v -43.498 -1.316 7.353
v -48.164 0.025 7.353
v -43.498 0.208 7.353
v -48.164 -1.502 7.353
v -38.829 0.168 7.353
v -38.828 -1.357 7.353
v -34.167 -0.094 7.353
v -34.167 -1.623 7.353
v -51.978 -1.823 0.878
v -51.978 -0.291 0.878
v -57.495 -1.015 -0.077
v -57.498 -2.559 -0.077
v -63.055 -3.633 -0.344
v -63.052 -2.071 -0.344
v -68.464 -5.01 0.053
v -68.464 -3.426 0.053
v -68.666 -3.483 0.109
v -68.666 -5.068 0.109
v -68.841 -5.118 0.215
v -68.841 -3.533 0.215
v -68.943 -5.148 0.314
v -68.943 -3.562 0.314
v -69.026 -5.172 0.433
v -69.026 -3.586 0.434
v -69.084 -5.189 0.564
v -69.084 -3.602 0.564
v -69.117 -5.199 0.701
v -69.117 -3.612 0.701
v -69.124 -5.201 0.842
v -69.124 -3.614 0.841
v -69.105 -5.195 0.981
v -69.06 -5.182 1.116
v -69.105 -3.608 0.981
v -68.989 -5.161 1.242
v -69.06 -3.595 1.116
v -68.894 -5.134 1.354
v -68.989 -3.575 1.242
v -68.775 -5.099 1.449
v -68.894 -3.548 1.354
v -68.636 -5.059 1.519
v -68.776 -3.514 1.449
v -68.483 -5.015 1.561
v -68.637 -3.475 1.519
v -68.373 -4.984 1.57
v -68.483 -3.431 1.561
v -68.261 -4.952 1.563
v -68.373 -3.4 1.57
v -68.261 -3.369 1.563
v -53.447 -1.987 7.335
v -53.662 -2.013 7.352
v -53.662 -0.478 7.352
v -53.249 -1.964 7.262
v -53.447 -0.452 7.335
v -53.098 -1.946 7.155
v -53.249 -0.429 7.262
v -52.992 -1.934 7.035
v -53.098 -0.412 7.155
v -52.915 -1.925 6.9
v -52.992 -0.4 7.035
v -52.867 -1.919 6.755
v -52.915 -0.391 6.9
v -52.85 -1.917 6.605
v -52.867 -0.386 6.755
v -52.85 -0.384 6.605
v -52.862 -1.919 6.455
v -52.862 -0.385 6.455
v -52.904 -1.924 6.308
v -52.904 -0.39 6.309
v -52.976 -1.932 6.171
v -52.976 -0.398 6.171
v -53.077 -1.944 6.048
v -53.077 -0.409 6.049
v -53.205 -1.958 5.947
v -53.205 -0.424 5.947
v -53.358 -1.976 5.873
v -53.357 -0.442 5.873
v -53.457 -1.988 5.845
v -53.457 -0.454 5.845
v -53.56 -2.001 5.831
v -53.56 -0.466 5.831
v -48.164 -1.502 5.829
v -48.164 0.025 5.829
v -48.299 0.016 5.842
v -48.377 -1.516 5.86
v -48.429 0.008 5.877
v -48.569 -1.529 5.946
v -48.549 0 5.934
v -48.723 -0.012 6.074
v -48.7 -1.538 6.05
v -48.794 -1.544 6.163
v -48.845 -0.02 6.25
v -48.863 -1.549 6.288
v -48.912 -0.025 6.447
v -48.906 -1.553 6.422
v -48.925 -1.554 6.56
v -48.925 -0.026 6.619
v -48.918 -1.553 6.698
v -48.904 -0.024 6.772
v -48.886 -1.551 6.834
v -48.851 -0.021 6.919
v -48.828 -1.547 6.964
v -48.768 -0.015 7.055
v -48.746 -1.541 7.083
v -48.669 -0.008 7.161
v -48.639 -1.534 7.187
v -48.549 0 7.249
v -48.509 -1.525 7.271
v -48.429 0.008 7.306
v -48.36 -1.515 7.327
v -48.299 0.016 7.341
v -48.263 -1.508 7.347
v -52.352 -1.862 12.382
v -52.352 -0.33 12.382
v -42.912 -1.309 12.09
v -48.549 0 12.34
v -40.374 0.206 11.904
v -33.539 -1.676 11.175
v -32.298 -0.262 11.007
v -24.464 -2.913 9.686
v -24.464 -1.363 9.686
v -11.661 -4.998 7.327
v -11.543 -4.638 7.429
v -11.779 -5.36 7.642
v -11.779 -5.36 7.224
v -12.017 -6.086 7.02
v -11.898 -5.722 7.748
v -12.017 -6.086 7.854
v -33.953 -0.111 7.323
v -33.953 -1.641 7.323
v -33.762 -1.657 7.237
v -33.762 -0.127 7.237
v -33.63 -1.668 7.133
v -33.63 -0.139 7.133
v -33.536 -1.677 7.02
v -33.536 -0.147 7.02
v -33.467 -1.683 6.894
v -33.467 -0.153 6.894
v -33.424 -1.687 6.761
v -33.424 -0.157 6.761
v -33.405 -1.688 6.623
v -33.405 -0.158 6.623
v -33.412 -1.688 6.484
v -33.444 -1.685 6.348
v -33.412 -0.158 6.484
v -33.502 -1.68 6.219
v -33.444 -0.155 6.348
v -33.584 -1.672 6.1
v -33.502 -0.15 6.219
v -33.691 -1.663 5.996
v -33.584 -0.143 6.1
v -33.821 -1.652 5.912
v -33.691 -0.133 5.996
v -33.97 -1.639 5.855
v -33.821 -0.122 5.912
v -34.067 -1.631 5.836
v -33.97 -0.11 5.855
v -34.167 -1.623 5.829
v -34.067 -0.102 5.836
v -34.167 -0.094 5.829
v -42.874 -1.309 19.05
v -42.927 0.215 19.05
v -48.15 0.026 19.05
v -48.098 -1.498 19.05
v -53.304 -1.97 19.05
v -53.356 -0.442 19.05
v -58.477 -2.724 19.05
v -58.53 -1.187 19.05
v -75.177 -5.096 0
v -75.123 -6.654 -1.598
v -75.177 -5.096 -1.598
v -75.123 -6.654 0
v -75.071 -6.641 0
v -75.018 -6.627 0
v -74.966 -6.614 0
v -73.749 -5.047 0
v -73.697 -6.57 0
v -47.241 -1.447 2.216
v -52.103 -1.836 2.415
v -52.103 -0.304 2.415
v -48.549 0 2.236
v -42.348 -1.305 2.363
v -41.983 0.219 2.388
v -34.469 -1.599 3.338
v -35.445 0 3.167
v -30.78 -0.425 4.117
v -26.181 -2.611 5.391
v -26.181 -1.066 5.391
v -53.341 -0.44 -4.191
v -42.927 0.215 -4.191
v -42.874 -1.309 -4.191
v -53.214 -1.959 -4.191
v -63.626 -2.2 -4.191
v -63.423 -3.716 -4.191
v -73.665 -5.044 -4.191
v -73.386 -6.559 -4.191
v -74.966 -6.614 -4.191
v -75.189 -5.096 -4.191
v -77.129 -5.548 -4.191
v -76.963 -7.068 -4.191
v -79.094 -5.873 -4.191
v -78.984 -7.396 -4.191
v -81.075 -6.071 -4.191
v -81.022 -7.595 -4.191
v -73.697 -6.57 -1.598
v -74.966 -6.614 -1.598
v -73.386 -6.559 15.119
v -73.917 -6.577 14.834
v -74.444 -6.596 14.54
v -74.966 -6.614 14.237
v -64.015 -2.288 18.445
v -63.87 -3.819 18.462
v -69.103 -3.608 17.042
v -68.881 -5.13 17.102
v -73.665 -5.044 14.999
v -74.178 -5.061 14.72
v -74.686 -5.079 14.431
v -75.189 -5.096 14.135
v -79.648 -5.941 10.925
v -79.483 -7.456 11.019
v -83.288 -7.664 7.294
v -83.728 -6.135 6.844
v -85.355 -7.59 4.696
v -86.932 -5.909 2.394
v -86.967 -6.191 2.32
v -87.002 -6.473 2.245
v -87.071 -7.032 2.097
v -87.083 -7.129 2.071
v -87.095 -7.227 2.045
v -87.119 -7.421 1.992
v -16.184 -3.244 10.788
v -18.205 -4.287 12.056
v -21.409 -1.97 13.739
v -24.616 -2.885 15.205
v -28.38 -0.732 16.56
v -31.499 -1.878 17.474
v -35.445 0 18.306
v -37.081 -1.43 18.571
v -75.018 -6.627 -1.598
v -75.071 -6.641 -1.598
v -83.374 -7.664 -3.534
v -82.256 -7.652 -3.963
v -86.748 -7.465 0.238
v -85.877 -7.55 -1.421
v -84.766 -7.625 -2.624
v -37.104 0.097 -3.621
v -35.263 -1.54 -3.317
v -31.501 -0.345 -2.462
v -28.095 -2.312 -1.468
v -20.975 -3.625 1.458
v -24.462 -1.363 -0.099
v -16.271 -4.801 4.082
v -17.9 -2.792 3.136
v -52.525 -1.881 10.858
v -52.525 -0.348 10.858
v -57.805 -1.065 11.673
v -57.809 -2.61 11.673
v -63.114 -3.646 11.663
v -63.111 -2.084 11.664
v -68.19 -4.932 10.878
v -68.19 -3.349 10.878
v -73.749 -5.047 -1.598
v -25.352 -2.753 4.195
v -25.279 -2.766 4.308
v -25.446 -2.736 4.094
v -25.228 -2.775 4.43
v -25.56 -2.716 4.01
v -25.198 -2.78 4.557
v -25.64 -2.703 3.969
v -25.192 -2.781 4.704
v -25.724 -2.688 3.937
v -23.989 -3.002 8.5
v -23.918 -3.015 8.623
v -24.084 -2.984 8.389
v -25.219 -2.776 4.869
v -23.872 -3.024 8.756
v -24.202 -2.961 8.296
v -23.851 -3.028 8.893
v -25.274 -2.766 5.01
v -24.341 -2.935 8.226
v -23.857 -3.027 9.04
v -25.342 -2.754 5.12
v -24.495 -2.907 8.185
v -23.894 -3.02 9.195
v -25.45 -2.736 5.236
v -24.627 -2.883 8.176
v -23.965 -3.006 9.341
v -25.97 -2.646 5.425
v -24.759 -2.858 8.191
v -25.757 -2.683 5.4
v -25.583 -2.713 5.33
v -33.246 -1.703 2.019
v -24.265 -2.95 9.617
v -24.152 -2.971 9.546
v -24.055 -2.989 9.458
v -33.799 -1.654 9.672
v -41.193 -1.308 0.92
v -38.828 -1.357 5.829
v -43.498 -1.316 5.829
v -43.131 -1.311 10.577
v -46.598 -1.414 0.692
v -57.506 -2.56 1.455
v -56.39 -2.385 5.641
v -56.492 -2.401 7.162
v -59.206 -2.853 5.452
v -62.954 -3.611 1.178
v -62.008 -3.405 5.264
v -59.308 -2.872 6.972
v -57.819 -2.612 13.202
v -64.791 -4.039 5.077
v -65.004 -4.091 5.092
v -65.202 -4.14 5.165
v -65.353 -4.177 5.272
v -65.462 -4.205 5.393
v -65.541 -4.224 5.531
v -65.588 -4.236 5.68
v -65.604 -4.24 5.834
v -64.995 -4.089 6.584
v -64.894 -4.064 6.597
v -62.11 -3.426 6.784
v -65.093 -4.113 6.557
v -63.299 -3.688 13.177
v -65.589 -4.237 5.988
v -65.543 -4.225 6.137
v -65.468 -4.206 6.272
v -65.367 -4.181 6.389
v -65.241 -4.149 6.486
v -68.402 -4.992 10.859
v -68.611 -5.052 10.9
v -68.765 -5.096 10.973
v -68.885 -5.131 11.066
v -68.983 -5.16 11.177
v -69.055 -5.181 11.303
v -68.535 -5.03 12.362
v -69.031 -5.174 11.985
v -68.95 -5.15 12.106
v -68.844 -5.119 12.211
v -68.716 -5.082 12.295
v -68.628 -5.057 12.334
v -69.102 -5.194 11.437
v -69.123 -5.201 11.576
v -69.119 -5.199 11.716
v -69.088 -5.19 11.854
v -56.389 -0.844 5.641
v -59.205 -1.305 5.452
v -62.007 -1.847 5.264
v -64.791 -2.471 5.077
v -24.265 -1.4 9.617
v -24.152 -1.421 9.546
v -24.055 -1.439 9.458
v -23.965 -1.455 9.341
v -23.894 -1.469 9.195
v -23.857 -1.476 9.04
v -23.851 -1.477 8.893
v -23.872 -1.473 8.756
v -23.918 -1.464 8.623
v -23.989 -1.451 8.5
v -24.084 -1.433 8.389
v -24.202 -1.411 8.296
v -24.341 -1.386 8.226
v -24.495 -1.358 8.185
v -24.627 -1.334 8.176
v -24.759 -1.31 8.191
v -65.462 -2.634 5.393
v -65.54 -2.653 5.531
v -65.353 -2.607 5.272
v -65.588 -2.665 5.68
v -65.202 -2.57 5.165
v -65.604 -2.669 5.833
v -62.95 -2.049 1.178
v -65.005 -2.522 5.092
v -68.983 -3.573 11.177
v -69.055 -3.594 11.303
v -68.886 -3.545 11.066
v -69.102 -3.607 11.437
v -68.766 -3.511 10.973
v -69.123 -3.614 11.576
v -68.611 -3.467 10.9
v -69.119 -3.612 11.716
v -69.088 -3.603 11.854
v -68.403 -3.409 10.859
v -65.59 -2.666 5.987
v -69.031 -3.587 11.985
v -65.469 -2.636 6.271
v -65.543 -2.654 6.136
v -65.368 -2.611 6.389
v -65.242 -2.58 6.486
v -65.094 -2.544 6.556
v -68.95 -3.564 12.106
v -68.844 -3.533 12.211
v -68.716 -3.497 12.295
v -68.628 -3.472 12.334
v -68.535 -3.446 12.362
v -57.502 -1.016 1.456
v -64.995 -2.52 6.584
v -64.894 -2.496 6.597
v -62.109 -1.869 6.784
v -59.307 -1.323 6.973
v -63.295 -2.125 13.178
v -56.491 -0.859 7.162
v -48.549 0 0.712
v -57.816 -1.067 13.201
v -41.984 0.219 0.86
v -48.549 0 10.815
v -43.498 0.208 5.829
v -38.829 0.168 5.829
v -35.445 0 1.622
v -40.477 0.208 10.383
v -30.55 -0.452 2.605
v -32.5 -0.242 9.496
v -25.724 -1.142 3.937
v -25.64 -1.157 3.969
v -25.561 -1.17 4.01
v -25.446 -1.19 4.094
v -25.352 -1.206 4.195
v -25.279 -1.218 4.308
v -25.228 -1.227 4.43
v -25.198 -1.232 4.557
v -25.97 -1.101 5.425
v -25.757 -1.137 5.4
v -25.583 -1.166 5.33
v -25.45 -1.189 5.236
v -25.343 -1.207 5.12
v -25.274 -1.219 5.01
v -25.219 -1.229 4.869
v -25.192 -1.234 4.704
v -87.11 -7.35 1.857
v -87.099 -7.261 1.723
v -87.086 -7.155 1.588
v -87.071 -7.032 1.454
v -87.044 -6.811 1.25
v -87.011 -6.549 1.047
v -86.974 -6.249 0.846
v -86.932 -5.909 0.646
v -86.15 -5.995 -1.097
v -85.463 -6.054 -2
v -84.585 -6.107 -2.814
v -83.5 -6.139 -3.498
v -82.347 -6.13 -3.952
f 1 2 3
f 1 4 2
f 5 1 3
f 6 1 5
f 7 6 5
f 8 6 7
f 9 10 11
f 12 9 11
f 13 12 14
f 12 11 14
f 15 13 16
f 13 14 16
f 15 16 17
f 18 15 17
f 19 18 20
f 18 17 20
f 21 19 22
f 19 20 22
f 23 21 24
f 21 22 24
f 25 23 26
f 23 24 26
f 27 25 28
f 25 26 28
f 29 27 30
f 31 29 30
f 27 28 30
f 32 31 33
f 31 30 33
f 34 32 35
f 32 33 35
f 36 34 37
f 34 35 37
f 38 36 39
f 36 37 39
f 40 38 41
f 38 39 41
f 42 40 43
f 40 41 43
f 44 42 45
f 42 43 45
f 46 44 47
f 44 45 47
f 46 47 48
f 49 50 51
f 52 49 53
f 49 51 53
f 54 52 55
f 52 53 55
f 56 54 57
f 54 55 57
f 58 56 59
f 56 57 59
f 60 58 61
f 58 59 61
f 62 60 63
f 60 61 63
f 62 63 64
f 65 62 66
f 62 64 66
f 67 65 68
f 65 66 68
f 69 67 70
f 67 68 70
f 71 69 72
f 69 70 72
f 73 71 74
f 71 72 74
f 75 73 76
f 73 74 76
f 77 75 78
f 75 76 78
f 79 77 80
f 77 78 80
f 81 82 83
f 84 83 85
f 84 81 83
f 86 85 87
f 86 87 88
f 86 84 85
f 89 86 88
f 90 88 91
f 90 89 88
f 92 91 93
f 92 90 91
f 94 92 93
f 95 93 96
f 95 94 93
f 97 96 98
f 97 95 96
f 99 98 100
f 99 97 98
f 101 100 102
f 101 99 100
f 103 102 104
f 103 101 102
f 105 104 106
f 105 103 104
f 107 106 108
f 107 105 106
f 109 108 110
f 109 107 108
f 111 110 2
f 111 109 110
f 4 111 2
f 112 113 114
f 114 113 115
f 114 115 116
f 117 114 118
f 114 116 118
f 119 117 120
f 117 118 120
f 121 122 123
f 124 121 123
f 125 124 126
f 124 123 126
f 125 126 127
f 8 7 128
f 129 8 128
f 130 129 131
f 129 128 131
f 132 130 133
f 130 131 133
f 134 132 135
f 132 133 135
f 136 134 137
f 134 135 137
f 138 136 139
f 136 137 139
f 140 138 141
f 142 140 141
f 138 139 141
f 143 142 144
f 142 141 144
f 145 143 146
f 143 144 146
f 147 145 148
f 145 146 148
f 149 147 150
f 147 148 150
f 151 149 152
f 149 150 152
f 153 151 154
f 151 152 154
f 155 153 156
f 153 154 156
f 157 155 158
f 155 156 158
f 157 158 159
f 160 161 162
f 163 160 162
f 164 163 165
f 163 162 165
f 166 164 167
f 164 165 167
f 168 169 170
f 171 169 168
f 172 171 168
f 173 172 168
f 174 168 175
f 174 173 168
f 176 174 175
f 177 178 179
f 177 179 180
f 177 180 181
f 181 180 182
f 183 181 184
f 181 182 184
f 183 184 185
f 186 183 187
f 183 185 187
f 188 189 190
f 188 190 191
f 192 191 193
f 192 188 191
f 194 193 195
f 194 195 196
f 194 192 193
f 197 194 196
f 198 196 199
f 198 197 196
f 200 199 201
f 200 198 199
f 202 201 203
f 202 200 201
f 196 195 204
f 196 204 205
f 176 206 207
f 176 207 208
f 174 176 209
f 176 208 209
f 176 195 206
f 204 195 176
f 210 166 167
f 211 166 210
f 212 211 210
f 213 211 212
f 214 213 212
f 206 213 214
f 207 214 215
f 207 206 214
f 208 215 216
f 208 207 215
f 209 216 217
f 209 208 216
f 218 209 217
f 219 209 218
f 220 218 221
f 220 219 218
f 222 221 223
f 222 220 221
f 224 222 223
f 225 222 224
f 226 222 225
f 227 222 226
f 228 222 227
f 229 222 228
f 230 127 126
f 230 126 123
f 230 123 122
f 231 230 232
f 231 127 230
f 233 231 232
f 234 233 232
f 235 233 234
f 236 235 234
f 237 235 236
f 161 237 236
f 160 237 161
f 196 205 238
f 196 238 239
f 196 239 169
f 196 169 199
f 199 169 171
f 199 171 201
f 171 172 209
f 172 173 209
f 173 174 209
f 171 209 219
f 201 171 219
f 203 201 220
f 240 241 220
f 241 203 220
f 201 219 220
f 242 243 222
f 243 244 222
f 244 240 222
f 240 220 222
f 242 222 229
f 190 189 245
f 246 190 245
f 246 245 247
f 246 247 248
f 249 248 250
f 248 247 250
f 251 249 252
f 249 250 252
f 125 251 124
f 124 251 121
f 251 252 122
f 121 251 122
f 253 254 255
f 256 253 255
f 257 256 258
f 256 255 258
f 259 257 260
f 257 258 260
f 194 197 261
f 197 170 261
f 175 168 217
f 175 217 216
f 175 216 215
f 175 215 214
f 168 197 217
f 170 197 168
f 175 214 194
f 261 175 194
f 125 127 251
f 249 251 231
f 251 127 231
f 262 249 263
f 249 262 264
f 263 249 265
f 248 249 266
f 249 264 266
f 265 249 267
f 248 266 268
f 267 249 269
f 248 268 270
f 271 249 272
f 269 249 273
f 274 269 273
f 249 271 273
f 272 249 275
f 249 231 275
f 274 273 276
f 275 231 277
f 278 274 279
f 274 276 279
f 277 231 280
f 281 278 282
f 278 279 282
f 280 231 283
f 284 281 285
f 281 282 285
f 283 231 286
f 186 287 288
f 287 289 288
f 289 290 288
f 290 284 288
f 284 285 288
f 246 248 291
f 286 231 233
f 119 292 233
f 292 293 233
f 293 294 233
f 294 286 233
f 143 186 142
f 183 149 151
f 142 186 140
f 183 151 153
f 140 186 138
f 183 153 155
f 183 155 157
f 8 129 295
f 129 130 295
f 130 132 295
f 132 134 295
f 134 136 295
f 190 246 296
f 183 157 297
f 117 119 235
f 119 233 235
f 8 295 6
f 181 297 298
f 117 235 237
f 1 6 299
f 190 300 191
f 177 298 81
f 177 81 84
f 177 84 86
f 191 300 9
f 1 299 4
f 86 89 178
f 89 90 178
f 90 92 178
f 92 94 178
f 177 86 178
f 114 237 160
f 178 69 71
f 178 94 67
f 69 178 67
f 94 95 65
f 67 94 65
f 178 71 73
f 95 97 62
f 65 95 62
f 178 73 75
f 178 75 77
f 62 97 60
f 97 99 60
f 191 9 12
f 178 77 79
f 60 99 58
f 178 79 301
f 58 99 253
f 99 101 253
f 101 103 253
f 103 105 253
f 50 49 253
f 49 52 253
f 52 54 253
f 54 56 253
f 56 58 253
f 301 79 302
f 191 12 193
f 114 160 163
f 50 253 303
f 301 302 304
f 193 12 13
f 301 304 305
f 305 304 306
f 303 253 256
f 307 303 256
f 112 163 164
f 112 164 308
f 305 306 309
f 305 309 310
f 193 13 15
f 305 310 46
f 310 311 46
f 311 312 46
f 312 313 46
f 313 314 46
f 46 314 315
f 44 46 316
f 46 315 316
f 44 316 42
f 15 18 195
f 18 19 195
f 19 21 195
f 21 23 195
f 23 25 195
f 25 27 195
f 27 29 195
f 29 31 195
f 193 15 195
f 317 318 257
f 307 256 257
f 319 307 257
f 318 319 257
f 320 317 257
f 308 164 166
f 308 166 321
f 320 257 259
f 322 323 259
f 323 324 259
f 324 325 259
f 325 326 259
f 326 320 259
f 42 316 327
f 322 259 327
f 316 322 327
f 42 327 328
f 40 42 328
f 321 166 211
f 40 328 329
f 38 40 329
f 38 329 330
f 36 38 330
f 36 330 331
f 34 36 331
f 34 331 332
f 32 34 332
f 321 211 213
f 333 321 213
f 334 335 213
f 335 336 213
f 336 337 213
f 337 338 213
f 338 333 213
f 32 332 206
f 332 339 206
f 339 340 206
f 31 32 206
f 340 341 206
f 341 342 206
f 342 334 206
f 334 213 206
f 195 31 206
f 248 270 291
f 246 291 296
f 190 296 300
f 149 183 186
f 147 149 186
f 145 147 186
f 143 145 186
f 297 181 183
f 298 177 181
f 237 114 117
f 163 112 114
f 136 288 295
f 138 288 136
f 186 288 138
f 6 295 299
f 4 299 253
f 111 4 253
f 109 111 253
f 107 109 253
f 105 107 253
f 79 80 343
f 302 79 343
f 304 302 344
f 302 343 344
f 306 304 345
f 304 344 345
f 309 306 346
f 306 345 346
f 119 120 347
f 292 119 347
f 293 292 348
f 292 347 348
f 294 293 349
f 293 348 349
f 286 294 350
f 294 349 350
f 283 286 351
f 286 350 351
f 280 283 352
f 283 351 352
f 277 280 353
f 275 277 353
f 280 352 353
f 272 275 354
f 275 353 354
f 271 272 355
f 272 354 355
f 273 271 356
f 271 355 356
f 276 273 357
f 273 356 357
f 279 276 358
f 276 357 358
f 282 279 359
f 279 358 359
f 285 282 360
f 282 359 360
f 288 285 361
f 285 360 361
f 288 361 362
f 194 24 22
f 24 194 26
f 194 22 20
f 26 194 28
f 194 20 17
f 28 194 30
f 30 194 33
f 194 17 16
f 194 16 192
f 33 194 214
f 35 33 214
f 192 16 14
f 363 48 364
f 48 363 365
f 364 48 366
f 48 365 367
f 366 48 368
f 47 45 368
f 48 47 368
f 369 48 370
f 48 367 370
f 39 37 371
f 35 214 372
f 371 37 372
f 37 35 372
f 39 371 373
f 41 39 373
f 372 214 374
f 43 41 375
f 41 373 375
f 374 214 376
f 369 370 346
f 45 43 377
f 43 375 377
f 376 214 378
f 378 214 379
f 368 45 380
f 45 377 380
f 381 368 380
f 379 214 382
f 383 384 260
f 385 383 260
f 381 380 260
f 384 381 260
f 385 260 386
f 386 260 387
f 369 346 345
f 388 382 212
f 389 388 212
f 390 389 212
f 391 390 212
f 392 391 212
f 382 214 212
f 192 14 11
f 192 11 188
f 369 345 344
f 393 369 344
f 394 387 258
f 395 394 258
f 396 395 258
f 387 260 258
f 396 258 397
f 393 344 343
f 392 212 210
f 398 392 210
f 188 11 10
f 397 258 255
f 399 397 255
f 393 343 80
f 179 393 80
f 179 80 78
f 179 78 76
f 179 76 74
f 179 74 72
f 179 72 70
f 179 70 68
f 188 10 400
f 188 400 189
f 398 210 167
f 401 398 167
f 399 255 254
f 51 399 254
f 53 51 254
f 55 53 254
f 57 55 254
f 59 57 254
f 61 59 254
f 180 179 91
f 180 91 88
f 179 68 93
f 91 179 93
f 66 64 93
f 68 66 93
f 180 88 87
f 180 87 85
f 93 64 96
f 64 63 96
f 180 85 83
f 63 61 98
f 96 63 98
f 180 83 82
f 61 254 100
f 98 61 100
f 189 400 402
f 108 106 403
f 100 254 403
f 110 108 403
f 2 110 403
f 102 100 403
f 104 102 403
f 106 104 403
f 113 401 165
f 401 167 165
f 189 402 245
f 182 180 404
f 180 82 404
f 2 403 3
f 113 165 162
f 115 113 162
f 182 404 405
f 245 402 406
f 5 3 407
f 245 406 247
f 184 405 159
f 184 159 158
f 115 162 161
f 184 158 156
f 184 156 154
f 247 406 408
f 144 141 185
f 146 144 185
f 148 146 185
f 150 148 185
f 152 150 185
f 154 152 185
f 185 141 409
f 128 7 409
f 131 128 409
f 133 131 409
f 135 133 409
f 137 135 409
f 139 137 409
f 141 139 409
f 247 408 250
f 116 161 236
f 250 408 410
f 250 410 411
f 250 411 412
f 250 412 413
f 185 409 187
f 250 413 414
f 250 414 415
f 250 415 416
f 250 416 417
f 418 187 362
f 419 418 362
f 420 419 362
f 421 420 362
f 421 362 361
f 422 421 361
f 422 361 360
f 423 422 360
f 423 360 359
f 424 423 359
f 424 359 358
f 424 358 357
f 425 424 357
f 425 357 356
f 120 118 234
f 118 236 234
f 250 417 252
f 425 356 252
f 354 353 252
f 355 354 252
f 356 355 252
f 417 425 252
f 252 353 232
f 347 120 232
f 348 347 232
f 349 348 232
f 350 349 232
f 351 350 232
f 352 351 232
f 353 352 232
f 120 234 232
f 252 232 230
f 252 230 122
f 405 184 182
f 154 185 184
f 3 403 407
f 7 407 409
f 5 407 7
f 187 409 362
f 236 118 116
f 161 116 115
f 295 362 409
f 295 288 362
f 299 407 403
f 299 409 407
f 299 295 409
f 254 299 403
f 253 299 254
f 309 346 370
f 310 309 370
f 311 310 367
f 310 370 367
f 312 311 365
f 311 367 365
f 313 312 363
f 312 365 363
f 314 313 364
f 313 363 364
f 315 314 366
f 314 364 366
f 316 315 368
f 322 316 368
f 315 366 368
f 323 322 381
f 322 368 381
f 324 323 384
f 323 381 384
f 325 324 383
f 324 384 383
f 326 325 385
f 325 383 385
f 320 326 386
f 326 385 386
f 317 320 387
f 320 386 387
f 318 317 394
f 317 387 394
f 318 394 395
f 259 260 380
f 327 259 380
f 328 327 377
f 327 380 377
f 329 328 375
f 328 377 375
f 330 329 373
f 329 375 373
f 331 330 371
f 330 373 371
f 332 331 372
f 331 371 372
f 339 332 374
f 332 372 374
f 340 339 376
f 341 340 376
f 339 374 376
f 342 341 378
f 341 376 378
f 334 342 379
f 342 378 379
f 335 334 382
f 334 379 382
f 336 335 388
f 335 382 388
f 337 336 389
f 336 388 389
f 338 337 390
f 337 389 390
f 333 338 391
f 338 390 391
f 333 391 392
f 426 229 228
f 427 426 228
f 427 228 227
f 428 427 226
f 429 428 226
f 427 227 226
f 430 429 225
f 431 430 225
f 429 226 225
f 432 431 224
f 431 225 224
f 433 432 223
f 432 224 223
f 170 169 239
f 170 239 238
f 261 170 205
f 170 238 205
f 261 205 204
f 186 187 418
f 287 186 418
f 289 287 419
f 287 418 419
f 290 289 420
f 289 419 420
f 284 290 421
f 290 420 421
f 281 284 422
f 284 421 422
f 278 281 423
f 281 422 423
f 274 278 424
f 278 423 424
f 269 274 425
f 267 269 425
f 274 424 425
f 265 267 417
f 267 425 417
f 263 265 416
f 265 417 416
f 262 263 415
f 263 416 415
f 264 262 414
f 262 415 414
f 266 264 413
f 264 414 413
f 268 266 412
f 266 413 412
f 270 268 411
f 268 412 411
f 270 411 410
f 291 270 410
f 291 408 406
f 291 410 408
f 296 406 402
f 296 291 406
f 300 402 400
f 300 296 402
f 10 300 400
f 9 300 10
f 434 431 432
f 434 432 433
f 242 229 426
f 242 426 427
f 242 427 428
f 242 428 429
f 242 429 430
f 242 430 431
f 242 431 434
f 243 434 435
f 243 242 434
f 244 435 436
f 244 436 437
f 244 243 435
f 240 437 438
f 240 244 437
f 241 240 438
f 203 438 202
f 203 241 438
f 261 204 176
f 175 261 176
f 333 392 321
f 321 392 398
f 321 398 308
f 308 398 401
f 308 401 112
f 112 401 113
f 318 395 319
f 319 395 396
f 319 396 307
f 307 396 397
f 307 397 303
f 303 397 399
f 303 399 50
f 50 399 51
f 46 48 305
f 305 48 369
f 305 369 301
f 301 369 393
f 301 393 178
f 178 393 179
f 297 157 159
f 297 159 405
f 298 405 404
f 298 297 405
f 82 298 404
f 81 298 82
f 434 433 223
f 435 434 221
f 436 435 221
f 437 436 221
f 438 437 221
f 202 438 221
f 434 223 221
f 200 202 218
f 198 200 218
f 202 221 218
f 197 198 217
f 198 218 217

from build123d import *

# Parameters (mm, degrees)
BOSS_EXTRUDE1_DEPTH      = 19.05
BOSS_EXTRUDE1_DEPTH_BACK = 4.191
CUT_EXTRUDE1_DEPTH       = 90.413592179
CUT_EXTRUDE1_DEPTH_BACK  = 90.413592179
SKETCH2_W                = 87.253712628
SKETCH2_H                = 39.813319923
CUT_EXTRUDE2_DEPTH       = 19.05
CUT_EXTRUDE2_DEPTH_BACK  = 19.05
SKETCH3_W                = 1.428322818
SKETCH3_H                = 1.598014705
CUT_EXTRUDE3_DEPTH       = 90.506248835
CUT_EXTRUDE3_DEPTH_BACK  = 90.506248835


with BuildPart() as part:
    # Sketch1 → Boss-Extrude1 (new, two sides: drawn at the far end of the back side and taken through both)
    with BuildSketch(Plane.XY.offset(-BOSS_EXTRUDE1_DEPTH_BACK)):
        with BuildLine():
            Line((-75.189237024, -5.096374737), (-73.665237024, -5.043705171))
            ThreePointArc((-73.665237024, -5.043705171), (-42.636952293, 0.217377617), (-11.542527873, -4.637539006))
            Line((-11.542527873, -4.637539006), (-12.016580594, -6.085934677))
            ThreePointArc((-12.016580594, -6.085934677), (-42.739704949, -1.307392681), (-73.385520331, -6.558947999))
            Line((-73.385520331, -6.558947999), (-74.965667148, -6.613558005))
            ThreePointArc((-74.965667148, -6.613558005), (-81.004050329, -7.593414774), (-87.118989346, -7.421044375))
            Line((-87.118989346, -7.421044375), (-86.932454331, -5.908503239))
            ThreePointArc((-86.932454331, -5.908503239), (-81.021793865, -6.067120464), (-75.189237024, -5.096374737))
        make_face()
    extrude(amount=BOSS_EXTRUDE1_DEPTH + BOSS_EXTRUDE1_DEPTH_BACK)

    # Sketch2 → Cut-Extrude1 (cut, two sides: drawn at the far end of the back side and taken through both)
    with BuildSketch(Plane(origin=(0.138860316, -4.017939298, 0), x_dir=(-0.9994033347691804, -0.03453946224598228, 0), z_dir=(0.03453946224598228, -0.9994033347691804, 0)).offset(-CUT_EXTRUDE1_DEPTH_BACK)):
        with Locations((49.508356896, -7.260136502)):
            Rectangle(SKETCH2_W, SKETCH2_H)
        with BuildLine():
            Line((42.893945954, -19.05), (58.535995628, -19.05))
            ThreePointArc((58.535995628, -19.05), (75.136021198, -14.244685293), (87.323327356, -1.992278715))
            ThreePointArc((87.323327356, -1.992278715), (85.416060887, 2.217888864), (81.236346917, 4.191))
            Line((81.236346917, 4.191), (42.893945954, 4.191))
            ThreePointArc((42.893945954, 4.191), (26.378637692, 0.840637304), (11.695818951, -7.4295))
            ThreePointArc((11.695818951, -7.4295), (26.325842273, -15.841379758), (42.893945954, -19.05))
        make_face(mode=Mode.SUBTRACT)
    extrude(amount=CUT_EXTRUDE1_DEPTH + CUT_EXTRUDE1_DEPTH_BACK, mode=Mode.SUBTRACT)

    # Sketch3 → Cut-Extrude2 (cut, two sides: drawn at the far end of the back side and taken through both)
    with BuildSketch(Plane(origin=(0.138860316, -4.017939298, 0), x_dir=(0.9994033347691804, 0.03453946224598228, 0), z_dir=(0.03453946224598228, -0.9994033347691804, 0)).offset(-CUT_EXTRUDE2_DEPTH_BACK)):
        with Locations((-74.593800237, -0.799007353)):
            Rectangle(SKETCH3_W, SKETCH3_H)
    extrude(amount=CUT_EXTRUDE2_DEPTH + CUT_EXTRUDE2_DEPTH_BACK, mode=Mode.SUBTRACT)

    # Sketch4 → Cut-Extrude3 (cut, two sides: drawn at the far end of the back side and taken through both)
    with BuildSketch(Plane(origin=(0, 0, 0), x_dir=(1, 0, 0), z_dir=(0, 1, 0)).offset(-CUT_EXTRUDE3_DEPTH_BACK)):
        with BuildLine():
            Line((-64.893542216, -6.597323199), (-53.662481079, -7.351648201))
            ThreePointArc((-53.662481079, -7.351648201), (-52.851129929, -6.642425168), (-53.560352962, -5.831074017))
            Line((-53.560352962, -5.831074017), (-64.791414099, -5.076749016))
            ThreePointArc((-64.791414099, -5.076749016), (-65.60276525, -5.785972049), (-64.893542216, -6.597323199))
        make_face()
        with BuildLine():
            Line((-48.16351423, -7.353361109), (-34.166594754, -7.353361109))
            ThreePointArc((-34.166594754, -7.353361109), (-33.404594754, -6.591361109), (-34.166594754, -5.829361109))
            Line((-34.166594754, -5.829361109), (-48.16351423, -5.829361109))
            ThreePointArc((-48.16351423, -5.829361109), (-48.92551423, -6.591361109), (-48.16351423, -7.353361109))
        make_face()
        with BuildLine():
            ThreePointArc((-68.534997951, -12.362450574), (-60.444707089, -13.294377363), (-52.352141863, -12.382411445))
            ThreePointArc((-52.352141863, -12.382411445), (-38.341637279, -11.721973531), (-24.464171754, -9.685710393))
            ThreePointArc((-24.464171754, -9.685710393), (-23.864251009, -8.790510359), (-24.759451042, -8.190589614))
            ThreePointArc((-24.759451042, -8.190589614), (-38.575832063, -10.213483586), (-52.524637961, -10.857920208))
            ThreePointArc((-52.524637961, -10.857920208), (-60.356328328, -11.770376603), (-68.190325048, -10.877938334))
            ThreePointArc((-68.190325048, -10.877938334), (-69.104917619, -11.447858003), (-68.534997951, -12.362450574))
        make_face()
        with BuildLine():
            ThreePointArc((-25.724196054, -3.936751805), (-38.706541391, -1.164656942), (-51.978446223, -0.877703144))
            ThreePointArc((-51.978446223, -0.877703144), (-60.183282807, 0.29192564), (-68.463888537, -0.052956388))
            ThreePointArc((-68.463888537, -0.052956388), (-69.117907874, -0.9094298), (-68.261434462, -1.563449137))
            ThreePointArc((-68.261434462, -1.563449137), (-60.142415983, -1.236181897), (-52.102798554, -2.415213913))
            ThreePointArc((-52.102798554, -2.415213913), (-39.000033907, -2.664871884), (-26.181471193, -5.390531516))
            ThreePointArc((-26.181471193, -5.390531516), (-25.225943768, -4.892279229), (-25.724196054, -3.936751805))
        make_face()
    extrude(amount=CUT_EXTRUDE3_DEPTH + CUT_EXTRUDE3_DEPTH_BACK, mode=Mode.SUBTRACT)


solid = part.part
